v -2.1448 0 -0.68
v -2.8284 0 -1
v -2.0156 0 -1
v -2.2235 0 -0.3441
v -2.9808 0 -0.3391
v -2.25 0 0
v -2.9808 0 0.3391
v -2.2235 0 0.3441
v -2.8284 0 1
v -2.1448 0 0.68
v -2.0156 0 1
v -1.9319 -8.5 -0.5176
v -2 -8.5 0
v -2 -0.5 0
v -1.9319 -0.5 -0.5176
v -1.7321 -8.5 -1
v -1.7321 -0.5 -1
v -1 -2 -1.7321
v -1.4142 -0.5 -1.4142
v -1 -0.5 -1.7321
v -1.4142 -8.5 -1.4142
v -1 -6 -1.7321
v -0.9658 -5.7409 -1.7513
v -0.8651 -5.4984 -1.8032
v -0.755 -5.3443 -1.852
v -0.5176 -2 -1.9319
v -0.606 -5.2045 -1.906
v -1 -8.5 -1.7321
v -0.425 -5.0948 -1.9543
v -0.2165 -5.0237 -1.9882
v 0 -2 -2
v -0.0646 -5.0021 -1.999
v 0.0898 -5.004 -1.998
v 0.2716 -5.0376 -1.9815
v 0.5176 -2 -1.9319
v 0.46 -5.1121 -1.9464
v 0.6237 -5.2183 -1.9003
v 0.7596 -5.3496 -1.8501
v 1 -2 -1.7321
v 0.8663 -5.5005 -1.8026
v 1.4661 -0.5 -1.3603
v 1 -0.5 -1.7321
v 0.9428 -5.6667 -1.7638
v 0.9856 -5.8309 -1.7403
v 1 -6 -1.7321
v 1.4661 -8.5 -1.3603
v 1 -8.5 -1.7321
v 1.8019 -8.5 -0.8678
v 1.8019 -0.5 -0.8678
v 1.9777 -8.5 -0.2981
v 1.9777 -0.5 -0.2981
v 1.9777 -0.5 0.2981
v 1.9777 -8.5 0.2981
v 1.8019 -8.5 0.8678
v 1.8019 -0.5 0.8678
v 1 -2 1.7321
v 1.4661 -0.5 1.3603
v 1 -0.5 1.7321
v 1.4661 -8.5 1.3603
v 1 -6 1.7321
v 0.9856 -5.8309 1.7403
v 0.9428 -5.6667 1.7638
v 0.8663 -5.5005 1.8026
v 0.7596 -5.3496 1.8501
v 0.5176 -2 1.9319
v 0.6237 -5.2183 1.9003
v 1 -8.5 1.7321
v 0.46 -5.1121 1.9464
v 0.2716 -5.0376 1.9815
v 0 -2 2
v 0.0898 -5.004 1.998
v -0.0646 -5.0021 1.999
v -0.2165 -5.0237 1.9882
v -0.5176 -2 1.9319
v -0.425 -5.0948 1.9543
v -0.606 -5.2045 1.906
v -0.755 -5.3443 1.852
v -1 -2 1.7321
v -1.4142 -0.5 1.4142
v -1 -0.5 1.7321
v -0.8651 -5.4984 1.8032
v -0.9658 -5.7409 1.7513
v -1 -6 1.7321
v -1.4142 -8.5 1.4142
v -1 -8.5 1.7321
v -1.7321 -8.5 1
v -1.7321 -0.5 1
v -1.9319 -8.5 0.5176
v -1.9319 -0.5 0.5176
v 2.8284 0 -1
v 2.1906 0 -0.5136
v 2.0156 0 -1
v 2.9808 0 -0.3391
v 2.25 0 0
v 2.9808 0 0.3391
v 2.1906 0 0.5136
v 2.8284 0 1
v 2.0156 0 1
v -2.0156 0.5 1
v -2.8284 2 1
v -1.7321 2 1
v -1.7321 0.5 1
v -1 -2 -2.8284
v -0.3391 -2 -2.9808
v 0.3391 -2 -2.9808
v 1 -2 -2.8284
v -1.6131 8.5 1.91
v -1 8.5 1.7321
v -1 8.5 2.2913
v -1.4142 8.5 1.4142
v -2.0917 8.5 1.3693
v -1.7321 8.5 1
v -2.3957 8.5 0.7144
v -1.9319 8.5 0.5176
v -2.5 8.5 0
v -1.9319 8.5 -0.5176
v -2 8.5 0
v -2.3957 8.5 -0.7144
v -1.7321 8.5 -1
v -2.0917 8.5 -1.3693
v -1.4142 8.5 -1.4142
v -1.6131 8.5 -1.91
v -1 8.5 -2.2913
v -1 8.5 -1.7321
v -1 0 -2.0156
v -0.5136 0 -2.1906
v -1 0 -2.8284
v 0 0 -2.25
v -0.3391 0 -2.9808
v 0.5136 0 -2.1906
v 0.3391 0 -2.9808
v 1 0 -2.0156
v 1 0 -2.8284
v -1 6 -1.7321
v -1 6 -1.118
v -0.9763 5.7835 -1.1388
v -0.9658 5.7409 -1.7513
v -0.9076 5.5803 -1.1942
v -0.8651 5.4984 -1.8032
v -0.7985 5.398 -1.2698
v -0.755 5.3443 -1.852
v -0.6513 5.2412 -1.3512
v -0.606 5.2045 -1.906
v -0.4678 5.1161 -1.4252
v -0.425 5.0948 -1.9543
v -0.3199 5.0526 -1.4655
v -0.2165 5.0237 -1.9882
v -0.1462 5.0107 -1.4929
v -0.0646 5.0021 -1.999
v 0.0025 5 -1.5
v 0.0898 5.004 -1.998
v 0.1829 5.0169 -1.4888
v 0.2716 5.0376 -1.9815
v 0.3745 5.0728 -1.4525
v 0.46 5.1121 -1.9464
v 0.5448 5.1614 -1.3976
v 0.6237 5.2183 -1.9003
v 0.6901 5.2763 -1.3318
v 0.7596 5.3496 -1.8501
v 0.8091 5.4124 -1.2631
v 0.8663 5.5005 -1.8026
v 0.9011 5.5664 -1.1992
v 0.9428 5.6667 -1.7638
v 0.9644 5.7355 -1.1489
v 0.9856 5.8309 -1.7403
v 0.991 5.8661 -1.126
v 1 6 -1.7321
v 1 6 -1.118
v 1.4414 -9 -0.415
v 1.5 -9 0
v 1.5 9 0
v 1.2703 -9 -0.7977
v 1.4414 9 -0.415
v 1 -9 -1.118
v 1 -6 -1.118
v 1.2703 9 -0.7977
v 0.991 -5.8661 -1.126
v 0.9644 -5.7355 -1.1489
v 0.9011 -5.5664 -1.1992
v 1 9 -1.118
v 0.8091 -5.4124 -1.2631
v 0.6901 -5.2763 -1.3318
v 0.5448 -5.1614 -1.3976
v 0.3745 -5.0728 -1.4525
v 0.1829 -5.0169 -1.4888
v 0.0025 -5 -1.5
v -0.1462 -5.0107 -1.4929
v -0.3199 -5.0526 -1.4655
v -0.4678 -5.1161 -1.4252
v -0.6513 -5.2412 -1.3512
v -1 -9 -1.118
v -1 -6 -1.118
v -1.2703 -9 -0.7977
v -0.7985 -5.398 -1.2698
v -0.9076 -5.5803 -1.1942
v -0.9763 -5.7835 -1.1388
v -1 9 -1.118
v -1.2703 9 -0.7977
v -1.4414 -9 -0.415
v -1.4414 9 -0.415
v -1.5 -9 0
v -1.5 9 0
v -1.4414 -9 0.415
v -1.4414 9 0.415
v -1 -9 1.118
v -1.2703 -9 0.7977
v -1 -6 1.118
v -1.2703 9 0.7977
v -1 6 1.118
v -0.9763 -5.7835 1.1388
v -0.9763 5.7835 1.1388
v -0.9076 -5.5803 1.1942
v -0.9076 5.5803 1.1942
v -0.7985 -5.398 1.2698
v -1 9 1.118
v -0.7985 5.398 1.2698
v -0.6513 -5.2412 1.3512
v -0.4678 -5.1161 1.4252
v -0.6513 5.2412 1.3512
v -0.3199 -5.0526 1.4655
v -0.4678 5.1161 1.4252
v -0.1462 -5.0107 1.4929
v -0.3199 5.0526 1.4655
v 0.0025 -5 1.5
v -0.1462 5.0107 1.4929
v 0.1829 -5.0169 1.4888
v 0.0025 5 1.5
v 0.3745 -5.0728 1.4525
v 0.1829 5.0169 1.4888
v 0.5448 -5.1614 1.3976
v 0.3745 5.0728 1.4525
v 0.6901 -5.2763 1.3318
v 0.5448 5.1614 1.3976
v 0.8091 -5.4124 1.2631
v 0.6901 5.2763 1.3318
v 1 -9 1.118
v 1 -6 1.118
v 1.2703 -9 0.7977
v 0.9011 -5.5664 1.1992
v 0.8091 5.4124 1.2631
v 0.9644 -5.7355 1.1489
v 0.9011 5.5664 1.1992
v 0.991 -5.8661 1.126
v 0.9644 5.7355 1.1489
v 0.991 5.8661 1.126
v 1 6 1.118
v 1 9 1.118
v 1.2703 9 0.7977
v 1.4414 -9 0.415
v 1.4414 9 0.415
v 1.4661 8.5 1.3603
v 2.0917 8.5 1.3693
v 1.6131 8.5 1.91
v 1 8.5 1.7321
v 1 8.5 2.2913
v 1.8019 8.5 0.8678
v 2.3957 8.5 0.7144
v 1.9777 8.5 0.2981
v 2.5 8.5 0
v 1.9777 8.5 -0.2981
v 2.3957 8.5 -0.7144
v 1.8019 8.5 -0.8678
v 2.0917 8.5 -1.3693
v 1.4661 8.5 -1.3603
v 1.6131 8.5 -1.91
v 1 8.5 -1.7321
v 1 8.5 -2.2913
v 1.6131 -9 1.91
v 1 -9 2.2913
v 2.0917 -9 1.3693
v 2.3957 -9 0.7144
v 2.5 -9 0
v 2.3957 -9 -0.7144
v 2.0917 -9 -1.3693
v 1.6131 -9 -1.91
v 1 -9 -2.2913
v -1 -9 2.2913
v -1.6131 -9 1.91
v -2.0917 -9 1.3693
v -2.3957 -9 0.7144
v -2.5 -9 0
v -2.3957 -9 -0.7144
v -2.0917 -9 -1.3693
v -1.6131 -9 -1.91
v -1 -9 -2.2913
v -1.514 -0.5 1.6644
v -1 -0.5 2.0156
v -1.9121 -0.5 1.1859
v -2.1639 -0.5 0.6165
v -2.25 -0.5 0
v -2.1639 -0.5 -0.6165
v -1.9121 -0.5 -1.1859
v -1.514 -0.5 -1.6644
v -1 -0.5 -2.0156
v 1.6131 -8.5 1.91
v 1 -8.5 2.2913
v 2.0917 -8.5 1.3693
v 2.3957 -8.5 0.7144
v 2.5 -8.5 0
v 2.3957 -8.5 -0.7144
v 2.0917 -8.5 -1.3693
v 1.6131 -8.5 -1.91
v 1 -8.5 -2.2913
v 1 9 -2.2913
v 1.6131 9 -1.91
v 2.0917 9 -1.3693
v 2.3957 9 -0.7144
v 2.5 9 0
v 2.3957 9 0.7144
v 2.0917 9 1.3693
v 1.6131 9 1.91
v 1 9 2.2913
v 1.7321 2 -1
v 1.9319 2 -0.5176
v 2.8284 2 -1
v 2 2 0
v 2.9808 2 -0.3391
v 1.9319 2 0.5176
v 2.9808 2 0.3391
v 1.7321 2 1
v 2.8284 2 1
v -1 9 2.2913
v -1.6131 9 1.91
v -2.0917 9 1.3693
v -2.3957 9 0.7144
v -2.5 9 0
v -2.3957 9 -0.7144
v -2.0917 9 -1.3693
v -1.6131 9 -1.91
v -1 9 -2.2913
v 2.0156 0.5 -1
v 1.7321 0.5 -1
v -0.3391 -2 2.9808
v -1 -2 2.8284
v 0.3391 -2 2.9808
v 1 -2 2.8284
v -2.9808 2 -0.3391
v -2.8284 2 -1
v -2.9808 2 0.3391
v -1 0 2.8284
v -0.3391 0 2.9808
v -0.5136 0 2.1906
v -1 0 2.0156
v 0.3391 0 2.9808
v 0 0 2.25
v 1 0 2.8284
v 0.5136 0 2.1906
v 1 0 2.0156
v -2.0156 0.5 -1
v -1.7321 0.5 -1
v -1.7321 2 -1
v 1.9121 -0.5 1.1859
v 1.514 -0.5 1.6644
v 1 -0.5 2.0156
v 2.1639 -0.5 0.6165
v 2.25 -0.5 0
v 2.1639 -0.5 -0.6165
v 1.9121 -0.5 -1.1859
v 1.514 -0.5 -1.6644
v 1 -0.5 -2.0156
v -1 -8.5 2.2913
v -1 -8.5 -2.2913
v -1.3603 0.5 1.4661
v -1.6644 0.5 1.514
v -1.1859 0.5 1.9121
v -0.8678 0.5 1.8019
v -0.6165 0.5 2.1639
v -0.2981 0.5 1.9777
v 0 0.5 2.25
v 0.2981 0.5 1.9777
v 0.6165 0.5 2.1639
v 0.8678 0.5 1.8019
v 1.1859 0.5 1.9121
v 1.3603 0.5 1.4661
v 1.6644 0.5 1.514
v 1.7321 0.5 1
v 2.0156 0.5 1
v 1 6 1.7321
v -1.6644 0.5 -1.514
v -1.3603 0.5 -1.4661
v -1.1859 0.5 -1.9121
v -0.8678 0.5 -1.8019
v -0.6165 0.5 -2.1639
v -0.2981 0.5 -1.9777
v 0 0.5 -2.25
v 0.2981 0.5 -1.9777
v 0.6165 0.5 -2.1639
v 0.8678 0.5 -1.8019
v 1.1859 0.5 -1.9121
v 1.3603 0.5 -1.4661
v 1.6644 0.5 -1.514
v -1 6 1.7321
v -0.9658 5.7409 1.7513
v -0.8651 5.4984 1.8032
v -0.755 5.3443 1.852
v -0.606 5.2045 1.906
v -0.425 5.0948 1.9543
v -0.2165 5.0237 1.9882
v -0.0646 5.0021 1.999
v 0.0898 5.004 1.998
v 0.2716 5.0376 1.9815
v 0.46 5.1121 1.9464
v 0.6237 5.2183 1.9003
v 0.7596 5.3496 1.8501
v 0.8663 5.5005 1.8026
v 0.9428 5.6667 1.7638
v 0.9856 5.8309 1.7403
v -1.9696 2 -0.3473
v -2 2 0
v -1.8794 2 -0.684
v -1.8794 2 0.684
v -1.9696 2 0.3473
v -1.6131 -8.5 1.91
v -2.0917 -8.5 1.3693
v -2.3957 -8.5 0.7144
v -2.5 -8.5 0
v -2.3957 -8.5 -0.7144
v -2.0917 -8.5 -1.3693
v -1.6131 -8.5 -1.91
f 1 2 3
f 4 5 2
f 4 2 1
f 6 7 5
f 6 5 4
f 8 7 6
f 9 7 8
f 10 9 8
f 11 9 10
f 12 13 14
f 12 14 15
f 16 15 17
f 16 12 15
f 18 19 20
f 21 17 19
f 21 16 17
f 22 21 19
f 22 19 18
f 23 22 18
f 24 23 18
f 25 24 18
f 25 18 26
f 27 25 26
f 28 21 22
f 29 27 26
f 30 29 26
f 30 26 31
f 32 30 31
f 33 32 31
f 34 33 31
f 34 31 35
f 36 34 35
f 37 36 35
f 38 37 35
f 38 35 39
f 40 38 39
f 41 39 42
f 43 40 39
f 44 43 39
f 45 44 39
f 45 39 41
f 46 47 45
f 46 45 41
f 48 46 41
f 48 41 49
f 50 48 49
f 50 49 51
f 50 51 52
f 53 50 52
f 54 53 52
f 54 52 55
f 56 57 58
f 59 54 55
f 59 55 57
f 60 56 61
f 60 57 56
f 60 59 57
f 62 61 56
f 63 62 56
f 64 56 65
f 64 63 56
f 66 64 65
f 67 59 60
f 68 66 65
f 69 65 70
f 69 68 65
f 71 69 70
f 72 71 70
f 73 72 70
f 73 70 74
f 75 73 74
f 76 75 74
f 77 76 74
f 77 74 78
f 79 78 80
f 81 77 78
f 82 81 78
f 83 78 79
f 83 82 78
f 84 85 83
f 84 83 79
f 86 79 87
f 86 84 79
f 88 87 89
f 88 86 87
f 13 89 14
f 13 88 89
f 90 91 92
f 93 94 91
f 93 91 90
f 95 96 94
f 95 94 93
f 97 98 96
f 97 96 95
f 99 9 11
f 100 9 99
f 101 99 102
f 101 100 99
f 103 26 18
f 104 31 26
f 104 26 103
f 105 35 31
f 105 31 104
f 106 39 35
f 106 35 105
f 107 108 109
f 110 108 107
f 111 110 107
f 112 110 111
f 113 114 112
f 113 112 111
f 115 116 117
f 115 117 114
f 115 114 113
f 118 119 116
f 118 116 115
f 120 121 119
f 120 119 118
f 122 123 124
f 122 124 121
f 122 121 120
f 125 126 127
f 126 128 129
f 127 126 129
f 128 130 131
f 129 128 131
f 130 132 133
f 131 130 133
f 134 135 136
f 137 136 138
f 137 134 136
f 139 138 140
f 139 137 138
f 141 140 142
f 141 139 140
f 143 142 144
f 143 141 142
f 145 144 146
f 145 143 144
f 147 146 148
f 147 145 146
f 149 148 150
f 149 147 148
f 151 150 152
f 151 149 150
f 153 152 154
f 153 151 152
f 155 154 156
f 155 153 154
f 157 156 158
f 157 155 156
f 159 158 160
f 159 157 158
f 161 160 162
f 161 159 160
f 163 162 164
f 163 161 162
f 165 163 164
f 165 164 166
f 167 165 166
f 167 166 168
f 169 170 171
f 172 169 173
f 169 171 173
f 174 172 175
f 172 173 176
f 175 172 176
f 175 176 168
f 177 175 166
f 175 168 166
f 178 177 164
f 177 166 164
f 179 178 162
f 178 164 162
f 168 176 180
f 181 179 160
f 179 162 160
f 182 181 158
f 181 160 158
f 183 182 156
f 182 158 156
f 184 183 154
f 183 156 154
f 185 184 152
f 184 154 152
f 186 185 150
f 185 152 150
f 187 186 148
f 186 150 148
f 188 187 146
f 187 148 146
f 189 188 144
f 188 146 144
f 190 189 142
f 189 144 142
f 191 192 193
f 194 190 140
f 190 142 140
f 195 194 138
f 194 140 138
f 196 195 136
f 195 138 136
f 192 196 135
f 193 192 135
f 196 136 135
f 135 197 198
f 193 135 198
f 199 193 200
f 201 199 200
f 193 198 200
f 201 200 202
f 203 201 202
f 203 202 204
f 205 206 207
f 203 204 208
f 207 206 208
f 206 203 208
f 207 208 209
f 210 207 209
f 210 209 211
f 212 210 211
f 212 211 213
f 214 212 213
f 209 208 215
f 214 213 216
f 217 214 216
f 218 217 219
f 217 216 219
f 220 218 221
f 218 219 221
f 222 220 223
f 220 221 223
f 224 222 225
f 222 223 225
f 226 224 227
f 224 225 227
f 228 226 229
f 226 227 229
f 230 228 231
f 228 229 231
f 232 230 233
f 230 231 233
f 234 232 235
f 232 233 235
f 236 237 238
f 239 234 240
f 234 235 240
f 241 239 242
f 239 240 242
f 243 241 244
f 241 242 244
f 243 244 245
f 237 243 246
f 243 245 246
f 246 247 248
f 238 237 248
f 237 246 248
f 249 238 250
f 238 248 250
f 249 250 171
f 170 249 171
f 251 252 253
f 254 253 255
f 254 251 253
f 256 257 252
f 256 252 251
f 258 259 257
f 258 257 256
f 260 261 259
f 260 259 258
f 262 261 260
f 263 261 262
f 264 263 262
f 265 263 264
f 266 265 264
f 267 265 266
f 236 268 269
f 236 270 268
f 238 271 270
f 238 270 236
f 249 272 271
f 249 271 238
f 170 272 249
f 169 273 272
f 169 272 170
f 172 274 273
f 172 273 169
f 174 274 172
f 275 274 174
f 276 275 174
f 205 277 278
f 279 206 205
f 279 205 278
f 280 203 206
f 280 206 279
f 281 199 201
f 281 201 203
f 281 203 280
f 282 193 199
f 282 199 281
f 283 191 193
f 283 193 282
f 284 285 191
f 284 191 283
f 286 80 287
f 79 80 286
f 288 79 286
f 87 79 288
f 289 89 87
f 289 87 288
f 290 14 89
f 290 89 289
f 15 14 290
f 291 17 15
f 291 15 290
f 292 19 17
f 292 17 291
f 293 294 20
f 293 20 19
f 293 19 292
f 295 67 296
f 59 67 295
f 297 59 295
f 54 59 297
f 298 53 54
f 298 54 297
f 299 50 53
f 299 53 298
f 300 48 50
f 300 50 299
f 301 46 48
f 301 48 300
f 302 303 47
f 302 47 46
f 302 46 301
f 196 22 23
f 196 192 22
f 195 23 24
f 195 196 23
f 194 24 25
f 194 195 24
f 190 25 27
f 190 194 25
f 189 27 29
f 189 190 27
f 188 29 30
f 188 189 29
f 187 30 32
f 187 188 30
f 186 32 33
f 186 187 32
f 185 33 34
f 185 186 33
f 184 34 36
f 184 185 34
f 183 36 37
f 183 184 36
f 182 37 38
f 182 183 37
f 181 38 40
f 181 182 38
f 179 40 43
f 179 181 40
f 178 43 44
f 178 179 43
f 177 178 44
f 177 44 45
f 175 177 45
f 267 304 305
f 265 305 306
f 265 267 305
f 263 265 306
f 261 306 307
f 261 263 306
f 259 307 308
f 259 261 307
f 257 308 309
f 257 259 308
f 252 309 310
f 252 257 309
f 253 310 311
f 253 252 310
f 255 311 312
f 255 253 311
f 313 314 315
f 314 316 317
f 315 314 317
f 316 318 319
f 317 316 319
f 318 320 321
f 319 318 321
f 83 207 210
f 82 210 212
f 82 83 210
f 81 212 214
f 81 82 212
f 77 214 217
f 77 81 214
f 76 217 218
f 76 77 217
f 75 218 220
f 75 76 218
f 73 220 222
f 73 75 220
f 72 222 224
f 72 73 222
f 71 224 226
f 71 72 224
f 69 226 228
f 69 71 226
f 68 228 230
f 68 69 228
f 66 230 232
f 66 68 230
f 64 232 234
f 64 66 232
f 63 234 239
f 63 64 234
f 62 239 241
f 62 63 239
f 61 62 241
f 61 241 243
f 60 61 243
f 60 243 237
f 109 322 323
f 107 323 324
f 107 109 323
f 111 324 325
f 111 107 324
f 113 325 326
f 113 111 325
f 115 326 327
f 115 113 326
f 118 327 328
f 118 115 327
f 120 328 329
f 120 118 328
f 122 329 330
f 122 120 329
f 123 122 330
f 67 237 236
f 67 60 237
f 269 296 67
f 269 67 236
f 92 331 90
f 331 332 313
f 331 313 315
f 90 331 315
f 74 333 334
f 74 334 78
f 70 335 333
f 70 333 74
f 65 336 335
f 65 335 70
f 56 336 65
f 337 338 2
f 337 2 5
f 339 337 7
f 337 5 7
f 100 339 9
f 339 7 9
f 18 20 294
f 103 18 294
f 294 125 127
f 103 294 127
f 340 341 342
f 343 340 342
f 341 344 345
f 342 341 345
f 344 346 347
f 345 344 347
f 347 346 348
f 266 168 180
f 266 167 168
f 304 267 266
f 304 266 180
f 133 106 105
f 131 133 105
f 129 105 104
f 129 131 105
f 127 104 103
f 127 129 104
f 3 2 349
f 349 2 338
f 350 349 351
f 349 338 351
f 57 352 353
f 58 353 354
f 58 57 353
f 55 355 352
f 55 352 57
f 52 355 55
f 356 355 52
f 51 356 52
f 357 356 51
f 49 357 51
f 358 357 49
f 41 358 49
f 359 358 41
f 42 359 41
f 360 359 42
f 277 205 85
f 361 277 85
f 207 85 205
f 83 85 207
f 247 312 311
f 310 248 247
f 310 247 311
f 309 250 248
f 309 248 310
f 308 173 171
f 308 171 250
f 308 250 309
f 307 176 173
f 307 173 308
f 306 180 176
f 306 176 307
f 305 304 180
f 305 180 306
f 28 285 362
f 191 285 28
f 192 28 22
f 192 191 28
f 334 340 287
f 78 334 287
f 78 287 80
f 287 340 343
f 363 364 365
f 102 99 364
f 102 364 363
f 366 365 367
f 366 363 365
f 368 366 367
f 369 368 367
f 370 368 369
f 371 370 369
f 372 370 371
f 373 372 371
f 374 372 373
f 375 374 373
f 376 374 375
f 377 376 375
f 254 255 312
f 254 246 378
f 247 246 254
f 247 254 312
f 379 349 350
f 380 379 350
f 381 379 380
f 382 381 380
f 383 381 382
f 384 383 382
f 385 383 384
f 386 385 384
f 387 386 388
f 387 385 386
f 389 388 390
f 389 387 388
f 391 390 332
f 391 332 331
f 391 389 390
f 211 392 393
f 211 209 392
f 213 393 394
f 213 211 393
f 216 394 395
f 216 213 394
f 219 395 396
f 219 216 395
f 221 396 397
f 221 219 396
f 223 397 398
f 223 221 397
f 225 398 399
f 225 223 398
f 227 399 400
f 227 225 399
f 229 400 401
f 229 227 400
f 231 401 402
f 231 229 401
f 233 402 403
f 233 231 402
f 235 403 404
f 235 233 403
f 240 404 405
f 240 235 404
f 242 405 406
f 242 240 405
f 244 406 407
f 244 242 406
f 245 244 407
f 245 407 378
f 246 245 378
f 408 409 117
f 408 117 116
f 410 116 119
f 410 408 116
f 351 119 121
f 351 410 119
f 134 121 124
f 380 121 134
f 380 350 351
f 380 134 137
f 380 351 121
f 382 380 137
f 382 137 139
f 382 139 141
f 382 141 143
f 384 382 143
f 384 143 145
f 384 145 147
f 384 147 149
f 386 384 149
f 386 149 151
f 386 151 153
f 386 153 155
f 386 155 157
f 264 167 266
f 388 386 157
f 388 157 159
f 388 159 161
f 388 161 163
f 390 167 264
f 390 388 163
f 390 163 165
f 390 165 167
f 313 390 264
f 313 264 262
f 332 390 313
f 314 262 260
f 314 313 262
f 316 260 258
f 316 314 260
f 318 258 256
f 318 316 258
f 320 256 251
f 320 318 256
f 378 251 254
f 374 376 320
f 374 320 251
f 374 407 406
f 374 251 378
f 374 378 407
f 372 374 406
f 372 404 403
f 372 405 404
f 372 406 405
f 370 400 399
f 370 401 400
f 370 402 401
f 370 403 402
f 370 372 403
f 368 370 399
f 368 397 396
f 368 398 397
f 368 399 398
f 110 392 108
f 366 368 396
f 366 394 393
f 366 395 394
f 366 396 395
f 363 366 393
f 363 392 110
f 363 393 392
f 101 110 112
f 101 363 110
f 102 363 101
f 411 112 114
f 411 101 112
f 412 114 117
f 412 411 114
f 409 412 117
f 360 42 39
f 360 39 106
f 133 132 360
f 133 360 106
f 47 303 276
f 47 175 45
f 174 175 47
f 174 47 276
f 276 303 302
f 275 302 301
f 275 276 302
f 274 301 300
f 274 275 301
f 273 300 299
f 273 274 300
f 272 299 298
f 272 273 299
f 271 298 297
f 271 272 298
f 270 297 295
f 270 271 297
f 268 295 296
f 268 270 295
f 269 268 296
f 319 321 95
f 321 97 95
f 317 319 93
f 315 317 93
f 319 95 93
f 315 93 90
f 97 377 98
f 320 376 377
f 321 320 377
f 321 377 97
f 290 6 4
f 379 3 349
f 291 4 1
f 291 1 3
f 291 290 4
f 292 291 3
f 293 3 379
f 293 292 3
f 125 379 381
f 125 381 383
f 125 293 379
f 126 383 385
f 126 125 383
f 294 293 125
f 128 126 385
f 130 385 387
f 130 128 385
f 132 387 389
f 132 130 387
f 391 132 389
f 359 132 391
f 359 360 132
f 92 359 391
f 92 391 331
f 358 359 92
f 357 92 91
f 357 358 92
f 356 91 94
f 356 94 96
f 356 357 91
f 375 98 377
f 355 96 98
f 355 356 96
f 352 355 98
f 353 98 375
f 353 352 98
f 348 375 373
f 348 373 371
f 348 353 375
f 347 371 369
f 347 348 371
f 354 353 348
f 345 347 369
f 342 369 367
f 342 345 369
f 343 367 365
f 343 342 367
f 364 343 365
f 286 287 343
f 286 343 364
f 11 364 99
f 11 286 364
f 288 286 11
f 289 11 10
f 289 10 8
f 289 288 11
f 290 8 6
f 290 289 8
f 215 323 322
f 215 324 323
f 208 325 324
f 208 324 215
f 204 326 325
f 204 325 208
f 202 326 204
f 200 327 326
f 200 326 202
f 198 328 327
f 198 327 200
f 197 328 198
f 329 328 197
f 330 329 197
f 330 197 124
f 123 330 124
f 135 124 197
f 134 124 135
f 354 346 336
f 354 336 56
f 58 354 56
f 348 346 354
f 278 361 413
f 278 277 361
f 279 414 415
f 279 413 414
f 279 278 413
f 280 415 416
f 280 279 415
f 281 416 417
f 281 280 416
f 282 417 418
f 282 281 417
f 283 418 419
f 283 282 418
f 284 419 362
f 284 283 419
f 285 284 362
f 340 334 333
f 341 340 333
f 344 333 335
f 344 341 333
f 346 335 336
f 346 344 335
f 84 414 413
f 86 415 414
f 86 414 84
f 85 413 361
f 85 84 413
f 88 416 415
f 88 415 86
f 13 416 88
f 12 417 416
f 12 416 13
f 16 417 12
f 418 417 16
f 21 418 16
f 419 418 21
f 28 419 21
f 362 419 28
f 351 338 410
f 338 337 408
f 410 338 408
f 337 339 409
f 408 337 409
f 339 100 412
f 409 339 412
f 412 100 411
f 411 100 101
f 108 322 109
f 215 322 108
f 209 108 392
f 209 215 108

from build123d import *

# Parameters (mm, degrees)
SKETCH3_W               = 6
SKETCH3_H               = 2
BOSS_EXTRUDE4_DEPTH     = 1
SKETCH4_W               = 6
SKETCH4_H               = 2
BOSS_EXTRUDE5_DEPTH     = 1
CUT_EXTRUDE2_DEPTH      = 4
CUT_EXTRUDE2_DEPTH_BACK = 4
SKETCH6_R               = 1.5
CUT_EXTRUDE3_DEPTH      = 18
SKETCH7_OUTSIDE_W       = 11.98
SKETCH7_OUTSIDE_H       = 11.98
SKETCH7_OUTSIDE_R       = 3
CUT_EXTRUDE4_DEPTH      = 10.0000001
CUT_EXTRUDE4_DEPTH_BACK = 10.0000001


with BuildPart() as part:
    # Sketch1 → Revolve5 (revolve)
    with BuildSketch(Plane.XY):
        Polygon((0, 9), (-2.5, 9), (-2.5, 8.5), (-2, 8.5), (-2, 0.5), (-2.25, 0.5), (-2.25, -0.5), (-2, -0.5), (-2, -8.5), (-2.5, -8.5), (-2.5, -9), (0, -9), align=None)
    revolve(axis=Axis((0, 9, 0), (0, -1, 0)))

    # Sketch3 → Boss-Extrude4 (add, symmetric)
    with BuildSketch(Plane.XY):
        with Locations((0, 1)):
            Rectangle(SKETCH3_W, SKETCH3_H)
    extrude(amount=BOSS_EXTRUDE4_DEPTH, both=True)

    # Sketch4 → Boss-Extrude5 (add, symmetric)
    with BuildSketch(Plane(origin=(0, 0, 0), x_dir=(0, 0, -1), z_dir=(1, 0, 0))):
        with Locations((0, -1)):
            Rectangle(SKETCH4_W, SKETCH4_H)
    extrude(amount=BOSS_EXTRUDE5_DEPTH, both=True)

    # Sketch5 → Cut-Extrude2 (cut, two sides)
    with BuildSketch(Plane.XY) as cut_extrude2_sk:
        with BuildLine():
            Line((-1, 9), (-1, 6))
            ThreePointArc((-1, 6), (0, 5), (1, 6))
            Line((1, 6), (1, 9))
            Line((1, 9), (-1, 9))
        make_face()
        with BuildLine():
            Line((-1, -9), (-1, -6))
            ThreePointArc((-1, -6), (0, -5), (1, -6))
            Line((1, -6), (1, -9))
            Line((1, -9), (-1, -9))
        make_face()
    extrude(amount=CUT_EXTRUDE2_DEPTH, mode=Mode.SUBTRACT)
    extrude(cut_extrude2_sk.sketch, amount=-CUT_EXTRUDE2_DEPTH_BACK, mode=Mode.SUBTRACT)

    # Sketch6 → Cut-Extrude3 (cut)
    with BuildSketch(Plane(origin=(0, 9, 0), x_dir=(1, 0, 0), z_dir=(0, 1, 0))):
        Circle(SKETCH6_R)
    extrude(amount=-CUT_EXTRUDE3_DEPTH, mode=Mode.SUBTRACT)

    # Sketch7 outside → Cut-Extrude4 (cut, two sides)
    with BuildSketch(Plane(origin=(0, 0, 0), x_dir=(1, 0, 0), z_dir=(0, 1, 0))) as cut_extrude4_sk:
        Rectangle(SKETCH7_OUTSIDE_W, SKETCH7_OUTSIDE_H)
        Circle(SKETCH7_OUTSIDE_R, mode=Mode.SUBTRACT)
    extrude(amount=CUT_EXTRUDE4_DEPTH, mode=Mode.SUBTRACT)
    extrude(cut_extrude4_sk.sketch, amount=-CUT_EXTRUDE4_DEPTH_BACK, mode=Mode.SUBTRACT)


solid = part.part
